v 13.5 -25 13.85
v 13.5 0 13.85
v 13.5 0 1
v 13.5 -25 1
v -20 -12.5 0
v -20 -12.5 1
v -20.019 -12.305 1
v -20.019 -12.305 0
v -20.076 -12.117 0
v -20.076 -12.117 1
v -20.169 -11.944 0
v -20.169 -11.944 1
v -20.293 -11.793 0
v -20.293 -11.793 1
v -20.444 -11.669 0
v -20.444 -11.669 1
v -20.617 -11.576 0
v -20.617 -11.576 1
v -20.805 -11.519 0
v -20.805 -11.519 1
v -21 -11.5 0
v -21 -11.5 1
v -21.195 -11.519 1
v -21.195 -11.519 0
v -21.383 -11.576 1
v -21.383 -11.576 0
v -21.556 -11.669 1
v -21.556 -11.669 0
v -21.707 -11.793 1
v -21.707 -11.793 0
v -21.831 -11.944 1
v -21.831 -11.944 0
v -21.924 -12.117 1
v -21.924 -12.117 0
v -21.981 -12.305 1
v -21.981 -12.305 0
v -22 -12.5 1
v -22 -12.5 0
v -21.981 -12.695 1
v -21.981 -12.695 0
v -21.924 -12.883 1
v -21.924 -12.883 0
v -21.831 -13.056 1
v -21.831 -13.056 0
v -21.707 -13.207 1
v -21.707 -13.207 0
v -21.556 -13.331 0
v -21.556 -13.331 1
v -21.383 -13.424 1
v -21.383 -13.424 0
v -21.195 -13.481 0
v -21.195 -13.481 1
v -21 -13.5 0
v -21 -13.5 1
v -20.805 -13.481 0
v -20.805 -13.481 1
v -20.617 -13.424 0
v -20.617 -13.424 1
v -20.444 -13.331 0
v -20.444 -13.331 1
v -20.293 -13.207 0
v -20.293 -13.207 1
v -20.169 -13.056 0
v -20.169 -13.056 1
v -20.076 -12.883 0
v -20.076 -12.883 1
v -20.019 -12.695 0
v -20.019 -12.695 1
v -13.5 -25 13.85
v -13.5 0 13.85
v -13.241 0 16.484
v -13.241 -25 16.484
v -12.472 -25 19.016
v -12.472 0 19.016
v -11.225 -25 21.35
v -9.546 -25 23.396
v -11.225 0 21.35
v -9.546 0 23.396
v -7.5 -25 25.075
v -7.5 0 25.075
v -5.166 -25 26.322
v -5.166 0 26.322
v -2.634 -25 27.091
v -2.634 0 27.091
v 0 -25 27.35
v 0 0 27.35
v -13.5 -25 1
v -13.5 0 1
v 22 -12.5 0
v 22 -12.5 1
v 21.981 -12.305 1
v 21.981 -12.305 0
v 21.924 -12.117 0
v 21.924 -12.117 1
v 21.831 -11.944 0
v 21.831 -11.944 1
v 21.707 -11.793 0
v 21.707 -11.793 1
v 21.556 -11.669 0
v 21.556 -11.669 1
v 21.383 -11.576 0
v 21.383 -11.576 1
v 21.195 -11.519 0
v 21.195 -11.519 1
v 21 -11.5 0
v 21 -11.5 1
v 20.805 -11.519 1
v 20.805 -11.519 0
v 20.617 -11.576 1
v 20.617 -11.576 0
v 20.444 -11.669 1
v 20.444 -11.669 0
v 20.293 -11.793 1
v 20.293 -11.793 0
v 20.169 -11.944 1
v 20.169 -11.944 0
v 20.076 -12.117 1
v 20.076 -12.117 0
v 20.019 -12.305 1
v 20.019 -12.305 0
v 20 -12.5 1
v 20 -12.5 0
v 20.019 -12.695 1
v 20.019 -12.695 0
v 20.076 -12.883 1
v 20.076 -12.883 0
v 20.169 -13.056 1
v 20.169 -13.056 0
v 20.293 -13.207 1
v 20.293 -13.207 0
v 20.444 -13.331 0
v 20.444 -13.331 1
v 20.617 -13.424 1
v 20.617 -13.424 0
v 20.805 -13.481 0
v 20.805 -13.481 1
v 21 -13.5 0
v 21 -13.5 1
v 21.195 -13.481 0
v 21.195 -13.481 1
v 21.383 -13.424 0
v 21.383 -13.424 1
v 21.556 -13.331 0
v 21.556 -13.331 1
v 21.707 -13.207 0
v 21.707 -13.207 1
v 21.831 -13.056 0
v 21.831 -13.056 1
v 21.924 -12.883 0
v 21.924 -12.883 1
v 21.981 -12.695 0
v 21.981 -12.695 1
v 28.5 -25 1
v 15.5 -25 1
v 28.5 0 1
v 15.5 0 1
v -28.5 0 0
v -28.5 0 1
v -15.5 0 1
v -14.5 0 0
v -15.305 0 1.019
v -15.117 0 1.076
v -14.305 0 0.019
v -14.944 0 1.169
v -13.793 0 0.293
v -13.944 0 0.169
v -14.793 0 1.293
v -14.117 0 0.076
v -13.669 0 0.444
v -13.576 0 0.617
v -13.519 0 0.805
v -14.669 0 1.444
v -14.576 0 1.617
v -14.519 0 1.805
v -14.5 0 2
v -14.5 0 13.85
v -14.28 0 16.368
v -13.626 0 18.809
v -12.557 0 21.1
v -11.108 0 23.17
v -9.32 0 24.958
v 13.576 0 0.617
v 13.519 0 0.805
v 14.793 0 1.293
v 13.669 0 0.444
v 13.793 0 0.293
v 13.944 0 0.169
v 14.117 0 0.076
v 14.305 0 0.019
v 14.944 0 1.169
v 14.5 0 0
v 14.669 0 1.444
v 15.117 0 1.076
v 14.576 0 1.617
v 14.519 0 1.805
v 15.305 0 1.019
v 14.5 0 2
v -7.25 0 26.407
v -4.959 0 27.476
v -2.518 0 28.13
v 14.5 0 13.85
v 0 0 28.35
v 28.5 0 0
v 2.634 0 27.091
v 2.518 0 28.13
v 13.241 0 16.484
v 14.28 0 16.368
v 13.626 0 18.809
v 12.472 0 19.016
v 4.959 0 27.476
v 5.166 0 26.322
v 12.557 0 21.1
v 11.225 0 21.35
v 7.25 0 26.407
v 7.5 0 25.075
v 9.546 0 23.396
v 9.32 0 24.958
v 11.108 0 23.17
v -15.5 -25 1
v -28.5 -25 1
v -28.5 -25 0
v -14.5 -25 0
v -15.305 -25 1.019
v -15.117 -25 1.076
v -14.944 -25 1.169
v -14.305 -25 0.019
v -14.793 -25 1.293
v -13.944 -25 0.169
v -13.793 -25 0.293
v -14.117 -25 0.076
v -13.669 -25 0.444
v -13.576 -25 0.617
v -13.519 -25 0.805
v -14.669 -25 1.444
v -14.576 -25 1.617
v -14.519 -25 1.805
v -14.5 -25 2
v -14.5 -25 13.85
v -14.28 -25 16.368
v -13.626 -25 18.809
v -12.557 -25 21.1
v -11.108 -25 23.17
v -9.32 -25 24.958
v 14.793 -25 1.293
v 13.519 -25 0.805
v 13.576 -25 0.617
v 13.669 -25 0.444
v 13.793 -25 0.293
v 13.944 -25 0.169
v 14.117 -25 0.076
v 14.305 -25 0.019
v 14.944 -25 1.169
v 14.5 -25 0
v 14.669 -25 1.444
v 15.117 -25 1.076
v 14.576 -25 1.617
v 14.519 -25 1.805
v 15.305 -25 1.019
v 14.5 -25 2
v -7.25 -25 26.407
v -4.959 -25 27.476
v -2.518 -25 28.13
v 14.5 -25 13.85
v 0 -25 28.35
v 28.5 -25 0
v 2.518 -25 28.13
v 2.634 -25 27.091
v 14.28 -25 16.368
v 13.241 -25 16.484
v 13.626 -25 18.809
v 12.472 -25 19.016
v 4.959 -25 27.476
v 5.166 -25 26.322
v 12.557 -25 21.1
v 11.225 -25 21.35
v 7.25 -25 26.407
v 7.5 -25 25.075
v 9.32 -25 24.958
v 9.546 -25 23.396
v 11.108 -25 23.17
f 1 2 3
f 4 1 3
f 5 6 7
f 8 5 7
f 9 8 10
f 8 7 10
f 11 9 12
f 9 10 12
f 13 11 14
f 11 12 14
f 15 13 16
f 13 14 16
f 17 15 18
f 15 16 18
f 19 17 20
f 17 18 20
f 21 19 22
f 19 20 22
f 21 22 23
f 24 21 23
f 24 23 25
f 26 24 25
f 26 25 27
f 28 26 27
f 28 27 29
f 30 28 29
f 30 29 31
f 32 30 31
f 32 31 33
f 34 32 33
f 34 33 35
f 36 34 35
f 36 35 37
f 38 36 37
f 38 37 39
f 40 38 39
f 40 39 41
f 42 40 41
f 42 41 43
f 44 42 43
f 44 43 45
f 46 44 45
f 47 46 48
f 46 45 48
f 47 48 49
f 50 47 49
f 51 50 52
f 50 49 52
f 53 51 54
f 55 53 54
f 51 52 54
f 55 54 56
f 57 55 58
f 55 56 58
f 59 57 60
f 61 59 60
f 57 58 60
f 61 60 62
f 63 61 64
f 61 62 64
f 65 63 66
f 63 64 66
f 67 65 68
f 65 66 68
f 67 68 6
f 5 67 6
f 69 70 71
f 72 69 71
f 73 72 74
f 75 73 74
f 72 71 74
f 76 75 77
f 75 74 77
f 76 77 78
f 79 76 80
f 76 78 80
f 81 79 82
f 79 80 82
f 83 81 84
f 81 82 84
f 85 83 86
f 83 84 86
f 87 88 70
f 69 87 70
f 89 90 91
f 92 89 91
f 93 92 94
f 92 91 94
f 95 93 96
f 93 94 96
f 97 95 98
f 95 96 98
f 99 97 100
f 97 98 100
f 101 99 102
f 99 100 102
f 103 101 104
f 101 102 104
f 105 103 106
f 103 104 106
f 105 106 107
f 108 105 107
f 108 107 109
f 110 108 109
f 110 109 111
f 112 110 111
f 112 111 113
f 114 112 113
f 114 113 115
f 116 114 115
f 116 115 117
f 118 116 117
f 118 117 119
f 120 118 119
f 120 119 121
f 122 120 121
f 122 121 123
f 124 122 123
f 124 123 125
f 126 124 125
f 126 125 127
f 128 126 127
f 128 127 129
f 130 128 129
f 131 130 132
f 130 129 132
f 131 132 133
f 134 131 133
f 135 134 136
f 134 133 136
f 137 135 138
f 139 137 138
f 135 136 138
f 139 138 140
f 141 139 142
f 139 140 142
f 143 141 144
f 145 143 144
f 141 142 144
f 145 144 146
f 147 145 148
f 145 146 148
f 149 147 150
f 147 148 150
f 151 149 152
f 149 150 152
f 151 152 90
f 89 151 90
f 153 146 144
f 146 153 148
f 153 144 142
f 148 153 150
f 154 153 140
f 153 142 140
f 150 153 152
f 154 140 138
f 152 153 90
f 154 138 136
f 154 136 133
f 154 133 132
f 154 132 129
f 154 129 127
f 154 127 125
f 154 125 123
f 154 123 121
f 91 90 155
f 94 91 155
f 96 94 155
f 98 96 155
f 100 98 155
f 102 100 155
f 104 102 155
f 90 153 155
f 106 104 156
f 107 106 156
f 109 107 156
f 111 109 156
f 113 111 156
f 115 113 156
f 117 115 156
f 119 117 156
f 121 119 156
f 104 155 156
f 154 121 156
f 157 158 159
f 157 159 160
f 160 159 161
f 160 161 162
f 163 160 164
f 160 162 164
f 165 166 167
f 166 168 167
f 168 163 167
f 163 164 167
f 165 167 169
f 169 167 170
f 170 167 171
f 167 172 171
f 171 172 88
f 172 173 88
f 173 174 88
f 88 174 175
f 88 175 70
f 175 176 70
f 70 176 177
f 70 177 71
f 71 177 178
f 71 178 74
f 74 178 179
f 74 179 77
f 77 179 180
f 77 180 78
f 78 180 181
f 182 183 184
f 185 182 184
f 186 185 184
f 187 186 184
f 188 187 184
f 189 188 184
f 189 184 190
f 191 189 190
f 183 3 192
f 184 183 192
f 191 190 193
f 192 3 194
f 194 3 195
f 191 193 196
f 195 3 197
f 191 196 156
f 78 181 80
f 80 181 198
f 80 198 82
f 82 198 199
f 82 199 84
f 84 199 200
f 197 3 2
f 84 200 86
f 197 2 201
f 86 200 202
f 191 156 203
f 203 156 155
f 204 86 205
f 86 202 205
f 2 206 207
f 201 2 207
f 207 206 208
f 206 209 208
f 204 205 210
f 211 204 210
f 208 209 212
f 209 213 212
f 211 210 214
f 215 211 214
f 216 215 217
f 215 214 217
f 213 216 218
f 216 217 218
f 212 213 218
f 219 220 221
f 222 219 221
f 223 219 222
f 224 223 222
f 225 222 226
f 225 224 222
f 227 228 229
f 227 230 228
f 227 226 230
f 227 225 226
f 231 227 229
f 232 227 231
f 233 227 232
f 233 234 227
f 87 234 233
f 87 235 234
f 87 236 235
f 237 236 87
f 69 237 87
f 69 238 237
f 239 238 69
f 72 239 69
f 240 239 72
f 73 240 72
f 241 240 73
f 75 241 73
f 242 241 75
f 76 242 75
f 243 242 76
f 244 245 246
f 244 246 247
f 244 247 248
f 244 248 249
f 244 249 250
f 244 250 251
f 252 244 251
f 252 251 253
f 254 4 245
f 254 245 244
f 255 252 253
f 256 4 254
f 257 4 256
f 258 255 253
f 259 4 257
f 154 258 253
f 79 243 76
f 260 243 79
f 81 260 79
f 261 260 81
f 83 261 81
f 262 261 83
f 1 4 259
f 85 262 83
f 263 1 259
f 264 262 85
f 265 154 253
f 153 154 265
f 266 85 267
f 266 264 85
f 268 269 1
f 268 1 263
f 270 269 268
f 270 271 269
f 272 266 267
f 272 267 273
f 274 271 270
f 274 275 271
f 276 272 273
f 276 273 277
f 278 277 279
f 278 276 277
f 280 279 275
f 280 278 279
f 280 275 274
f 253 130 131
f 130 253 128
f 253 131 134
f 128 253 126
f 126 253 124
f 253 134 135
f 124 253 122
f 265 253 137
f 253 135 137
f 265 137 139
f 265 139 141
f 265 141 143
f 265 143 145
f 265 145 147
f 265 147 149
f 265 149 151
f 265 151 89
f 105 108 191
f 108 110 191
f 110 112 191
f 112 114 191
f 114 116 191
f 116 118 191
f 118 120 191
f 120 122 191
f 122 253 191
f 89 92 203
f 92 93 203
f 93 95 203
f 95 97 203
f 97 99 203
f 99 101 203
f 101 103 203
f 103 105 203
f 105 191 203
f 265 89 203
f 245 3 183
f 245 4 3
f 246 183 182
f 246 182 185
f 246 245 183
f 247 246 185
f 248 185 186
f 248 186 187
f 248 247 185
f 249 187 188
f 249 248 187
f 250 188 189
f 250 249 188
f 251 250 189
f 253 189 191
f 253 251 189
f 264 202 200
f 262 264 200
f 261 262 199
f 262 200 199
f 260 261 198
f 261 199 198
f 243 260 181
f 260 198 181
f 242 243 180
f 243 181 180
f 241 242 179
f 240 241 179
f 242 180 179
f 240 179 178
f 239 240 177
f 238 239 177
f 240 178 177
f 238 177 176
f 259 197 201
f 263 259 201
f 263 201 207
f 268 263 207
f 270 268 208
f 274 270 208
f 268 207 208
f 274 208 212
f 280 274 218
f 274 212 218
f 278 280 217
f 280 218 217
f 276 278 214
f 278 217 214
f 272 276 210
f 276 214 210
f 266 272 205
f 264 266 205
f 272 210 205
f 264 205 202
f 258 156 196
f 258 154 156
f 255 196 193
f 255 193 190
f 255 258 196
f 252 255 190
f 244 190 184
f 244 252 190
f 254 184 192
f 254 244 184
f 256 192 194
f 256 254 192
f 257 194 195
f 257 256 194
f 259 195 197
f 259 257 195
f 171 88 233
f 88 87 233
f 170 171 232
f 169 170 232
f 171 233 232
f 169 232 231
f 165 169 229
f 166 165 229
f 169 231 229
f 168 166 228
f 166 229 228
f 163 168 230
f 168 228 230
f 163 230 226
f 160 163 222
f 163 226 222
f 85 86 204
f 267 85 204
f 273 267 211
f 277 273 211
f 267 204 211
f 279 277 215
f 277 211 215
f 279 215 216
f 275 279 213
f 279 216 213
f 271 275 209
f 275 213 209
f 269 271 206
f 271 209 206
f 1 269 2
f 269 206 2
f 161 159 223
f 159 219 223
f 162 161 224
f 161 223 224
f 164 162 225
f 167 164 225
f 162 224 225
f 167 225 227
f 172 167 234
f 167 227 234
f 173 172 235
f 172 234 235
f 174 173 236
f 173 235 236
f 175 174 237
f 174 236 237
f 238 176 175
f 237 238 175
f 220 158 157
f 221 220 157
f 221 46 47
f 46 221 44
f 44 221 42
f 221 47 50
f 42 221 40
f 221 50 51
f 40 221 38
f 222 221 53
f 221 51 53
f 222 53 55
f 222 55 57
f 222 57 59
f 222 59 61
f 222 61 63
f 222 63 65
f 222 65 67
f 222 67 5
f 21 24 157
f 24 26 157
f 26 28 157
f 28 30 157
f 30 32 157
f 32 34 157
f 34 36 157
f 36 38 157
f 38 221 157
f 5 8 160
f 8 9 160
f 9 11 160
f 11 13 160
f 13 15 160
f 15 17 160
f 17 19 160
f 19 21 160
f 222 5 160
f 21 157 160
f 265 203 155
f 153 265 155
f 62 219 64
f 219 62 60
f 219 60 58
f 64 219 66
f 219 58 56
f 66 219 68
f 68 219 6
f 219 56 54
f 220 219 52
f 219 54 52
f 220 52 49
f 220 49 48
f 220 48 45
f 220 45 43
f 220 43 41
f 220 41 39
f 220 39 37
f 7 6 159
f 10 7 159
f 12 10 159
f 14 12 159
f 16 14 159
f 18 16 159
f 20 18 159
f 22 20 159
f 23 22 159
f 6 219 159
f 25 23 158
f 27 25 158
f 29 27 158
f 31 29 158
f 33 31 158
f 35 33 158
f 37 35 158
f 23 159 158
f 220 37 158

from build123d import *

# Parameters (mm, degrees)
F1_DEPTH = 25
F2_R     = 1
F3_DEPTH = 25
F4_R     = 1
F5_R     = 1


with BuildPart() as f1:
    # F0 (on Front) → F1 (new body)
    with BuildSketch(Plane.XZ):
        with BuildLine():
            ThreePointArc((-13.5, 13.85), (-9.545942, 23.395942), (0, 27.35))
            Line((0, 27.35), (0, 28.35))
            ThreePointArc((0, 28.35), (-10.253048, 24.103048), (-14.5, 13.85))
            Line((-14.5, 13.85), (-14.5, 1))
            Line((-14.5, 1), (-28.5, 1))
            Line((-28.5, 1), (-28.5, 0))
            Line((-28.5, 0), (-13.5, 0))
            Line((-13.5, 0), (-13.5, 13.85))
        make_face()
        with BuildLine():
            Line((0, 28.35), (0, 27.35))
            ThreePointArc((0, 27.35), (9.545942, 23.395942), (13.5, 13.85))
            Line((13.5, 13.85), (13.5, 0))
            Line((13.5, 0), (28.5, 0))
            Line((28.5, 0), (28.5, 1))
            Line((28.5, 1), (14.5, 1))
            Line((14.5, 1), (14.5, 13.85))
            ThreePointArc((14.5, 13.85), (10.253048, 24.103048), (0, 28.35))
        make_face()
    extrude(amount=F1_DEPTH)

    # F2 (on face) → F3 (cut)
    with BuildSketch(Plane.XY.offset(1)):
        with Locations((-21, -12.5)):
            Circle(F2_R)
        with Locations((21, -12.5)):
            Circle(F2_R)
    extrude(amount=-F3_DEPTH, mode=Mode.SUBTRACT)

    # F4
    f4_edges = [f1.edges().sort_by_distance(p)[0] for p in [
        (14.5, -12.5, 1),
        (13.5, -12.5, 0),
    ]]
    fillet(f4_edges, radius=F4_R)

    # F5
    f5_edges = [f1.edges().sort_by_distance(p)[0] for p in [
        (-14.5, -12.5, 1),
        (-13.5, -12.5, 0),
    ]]
    fillet(f5_edges, radius=F5_R)


solid = f1.part
